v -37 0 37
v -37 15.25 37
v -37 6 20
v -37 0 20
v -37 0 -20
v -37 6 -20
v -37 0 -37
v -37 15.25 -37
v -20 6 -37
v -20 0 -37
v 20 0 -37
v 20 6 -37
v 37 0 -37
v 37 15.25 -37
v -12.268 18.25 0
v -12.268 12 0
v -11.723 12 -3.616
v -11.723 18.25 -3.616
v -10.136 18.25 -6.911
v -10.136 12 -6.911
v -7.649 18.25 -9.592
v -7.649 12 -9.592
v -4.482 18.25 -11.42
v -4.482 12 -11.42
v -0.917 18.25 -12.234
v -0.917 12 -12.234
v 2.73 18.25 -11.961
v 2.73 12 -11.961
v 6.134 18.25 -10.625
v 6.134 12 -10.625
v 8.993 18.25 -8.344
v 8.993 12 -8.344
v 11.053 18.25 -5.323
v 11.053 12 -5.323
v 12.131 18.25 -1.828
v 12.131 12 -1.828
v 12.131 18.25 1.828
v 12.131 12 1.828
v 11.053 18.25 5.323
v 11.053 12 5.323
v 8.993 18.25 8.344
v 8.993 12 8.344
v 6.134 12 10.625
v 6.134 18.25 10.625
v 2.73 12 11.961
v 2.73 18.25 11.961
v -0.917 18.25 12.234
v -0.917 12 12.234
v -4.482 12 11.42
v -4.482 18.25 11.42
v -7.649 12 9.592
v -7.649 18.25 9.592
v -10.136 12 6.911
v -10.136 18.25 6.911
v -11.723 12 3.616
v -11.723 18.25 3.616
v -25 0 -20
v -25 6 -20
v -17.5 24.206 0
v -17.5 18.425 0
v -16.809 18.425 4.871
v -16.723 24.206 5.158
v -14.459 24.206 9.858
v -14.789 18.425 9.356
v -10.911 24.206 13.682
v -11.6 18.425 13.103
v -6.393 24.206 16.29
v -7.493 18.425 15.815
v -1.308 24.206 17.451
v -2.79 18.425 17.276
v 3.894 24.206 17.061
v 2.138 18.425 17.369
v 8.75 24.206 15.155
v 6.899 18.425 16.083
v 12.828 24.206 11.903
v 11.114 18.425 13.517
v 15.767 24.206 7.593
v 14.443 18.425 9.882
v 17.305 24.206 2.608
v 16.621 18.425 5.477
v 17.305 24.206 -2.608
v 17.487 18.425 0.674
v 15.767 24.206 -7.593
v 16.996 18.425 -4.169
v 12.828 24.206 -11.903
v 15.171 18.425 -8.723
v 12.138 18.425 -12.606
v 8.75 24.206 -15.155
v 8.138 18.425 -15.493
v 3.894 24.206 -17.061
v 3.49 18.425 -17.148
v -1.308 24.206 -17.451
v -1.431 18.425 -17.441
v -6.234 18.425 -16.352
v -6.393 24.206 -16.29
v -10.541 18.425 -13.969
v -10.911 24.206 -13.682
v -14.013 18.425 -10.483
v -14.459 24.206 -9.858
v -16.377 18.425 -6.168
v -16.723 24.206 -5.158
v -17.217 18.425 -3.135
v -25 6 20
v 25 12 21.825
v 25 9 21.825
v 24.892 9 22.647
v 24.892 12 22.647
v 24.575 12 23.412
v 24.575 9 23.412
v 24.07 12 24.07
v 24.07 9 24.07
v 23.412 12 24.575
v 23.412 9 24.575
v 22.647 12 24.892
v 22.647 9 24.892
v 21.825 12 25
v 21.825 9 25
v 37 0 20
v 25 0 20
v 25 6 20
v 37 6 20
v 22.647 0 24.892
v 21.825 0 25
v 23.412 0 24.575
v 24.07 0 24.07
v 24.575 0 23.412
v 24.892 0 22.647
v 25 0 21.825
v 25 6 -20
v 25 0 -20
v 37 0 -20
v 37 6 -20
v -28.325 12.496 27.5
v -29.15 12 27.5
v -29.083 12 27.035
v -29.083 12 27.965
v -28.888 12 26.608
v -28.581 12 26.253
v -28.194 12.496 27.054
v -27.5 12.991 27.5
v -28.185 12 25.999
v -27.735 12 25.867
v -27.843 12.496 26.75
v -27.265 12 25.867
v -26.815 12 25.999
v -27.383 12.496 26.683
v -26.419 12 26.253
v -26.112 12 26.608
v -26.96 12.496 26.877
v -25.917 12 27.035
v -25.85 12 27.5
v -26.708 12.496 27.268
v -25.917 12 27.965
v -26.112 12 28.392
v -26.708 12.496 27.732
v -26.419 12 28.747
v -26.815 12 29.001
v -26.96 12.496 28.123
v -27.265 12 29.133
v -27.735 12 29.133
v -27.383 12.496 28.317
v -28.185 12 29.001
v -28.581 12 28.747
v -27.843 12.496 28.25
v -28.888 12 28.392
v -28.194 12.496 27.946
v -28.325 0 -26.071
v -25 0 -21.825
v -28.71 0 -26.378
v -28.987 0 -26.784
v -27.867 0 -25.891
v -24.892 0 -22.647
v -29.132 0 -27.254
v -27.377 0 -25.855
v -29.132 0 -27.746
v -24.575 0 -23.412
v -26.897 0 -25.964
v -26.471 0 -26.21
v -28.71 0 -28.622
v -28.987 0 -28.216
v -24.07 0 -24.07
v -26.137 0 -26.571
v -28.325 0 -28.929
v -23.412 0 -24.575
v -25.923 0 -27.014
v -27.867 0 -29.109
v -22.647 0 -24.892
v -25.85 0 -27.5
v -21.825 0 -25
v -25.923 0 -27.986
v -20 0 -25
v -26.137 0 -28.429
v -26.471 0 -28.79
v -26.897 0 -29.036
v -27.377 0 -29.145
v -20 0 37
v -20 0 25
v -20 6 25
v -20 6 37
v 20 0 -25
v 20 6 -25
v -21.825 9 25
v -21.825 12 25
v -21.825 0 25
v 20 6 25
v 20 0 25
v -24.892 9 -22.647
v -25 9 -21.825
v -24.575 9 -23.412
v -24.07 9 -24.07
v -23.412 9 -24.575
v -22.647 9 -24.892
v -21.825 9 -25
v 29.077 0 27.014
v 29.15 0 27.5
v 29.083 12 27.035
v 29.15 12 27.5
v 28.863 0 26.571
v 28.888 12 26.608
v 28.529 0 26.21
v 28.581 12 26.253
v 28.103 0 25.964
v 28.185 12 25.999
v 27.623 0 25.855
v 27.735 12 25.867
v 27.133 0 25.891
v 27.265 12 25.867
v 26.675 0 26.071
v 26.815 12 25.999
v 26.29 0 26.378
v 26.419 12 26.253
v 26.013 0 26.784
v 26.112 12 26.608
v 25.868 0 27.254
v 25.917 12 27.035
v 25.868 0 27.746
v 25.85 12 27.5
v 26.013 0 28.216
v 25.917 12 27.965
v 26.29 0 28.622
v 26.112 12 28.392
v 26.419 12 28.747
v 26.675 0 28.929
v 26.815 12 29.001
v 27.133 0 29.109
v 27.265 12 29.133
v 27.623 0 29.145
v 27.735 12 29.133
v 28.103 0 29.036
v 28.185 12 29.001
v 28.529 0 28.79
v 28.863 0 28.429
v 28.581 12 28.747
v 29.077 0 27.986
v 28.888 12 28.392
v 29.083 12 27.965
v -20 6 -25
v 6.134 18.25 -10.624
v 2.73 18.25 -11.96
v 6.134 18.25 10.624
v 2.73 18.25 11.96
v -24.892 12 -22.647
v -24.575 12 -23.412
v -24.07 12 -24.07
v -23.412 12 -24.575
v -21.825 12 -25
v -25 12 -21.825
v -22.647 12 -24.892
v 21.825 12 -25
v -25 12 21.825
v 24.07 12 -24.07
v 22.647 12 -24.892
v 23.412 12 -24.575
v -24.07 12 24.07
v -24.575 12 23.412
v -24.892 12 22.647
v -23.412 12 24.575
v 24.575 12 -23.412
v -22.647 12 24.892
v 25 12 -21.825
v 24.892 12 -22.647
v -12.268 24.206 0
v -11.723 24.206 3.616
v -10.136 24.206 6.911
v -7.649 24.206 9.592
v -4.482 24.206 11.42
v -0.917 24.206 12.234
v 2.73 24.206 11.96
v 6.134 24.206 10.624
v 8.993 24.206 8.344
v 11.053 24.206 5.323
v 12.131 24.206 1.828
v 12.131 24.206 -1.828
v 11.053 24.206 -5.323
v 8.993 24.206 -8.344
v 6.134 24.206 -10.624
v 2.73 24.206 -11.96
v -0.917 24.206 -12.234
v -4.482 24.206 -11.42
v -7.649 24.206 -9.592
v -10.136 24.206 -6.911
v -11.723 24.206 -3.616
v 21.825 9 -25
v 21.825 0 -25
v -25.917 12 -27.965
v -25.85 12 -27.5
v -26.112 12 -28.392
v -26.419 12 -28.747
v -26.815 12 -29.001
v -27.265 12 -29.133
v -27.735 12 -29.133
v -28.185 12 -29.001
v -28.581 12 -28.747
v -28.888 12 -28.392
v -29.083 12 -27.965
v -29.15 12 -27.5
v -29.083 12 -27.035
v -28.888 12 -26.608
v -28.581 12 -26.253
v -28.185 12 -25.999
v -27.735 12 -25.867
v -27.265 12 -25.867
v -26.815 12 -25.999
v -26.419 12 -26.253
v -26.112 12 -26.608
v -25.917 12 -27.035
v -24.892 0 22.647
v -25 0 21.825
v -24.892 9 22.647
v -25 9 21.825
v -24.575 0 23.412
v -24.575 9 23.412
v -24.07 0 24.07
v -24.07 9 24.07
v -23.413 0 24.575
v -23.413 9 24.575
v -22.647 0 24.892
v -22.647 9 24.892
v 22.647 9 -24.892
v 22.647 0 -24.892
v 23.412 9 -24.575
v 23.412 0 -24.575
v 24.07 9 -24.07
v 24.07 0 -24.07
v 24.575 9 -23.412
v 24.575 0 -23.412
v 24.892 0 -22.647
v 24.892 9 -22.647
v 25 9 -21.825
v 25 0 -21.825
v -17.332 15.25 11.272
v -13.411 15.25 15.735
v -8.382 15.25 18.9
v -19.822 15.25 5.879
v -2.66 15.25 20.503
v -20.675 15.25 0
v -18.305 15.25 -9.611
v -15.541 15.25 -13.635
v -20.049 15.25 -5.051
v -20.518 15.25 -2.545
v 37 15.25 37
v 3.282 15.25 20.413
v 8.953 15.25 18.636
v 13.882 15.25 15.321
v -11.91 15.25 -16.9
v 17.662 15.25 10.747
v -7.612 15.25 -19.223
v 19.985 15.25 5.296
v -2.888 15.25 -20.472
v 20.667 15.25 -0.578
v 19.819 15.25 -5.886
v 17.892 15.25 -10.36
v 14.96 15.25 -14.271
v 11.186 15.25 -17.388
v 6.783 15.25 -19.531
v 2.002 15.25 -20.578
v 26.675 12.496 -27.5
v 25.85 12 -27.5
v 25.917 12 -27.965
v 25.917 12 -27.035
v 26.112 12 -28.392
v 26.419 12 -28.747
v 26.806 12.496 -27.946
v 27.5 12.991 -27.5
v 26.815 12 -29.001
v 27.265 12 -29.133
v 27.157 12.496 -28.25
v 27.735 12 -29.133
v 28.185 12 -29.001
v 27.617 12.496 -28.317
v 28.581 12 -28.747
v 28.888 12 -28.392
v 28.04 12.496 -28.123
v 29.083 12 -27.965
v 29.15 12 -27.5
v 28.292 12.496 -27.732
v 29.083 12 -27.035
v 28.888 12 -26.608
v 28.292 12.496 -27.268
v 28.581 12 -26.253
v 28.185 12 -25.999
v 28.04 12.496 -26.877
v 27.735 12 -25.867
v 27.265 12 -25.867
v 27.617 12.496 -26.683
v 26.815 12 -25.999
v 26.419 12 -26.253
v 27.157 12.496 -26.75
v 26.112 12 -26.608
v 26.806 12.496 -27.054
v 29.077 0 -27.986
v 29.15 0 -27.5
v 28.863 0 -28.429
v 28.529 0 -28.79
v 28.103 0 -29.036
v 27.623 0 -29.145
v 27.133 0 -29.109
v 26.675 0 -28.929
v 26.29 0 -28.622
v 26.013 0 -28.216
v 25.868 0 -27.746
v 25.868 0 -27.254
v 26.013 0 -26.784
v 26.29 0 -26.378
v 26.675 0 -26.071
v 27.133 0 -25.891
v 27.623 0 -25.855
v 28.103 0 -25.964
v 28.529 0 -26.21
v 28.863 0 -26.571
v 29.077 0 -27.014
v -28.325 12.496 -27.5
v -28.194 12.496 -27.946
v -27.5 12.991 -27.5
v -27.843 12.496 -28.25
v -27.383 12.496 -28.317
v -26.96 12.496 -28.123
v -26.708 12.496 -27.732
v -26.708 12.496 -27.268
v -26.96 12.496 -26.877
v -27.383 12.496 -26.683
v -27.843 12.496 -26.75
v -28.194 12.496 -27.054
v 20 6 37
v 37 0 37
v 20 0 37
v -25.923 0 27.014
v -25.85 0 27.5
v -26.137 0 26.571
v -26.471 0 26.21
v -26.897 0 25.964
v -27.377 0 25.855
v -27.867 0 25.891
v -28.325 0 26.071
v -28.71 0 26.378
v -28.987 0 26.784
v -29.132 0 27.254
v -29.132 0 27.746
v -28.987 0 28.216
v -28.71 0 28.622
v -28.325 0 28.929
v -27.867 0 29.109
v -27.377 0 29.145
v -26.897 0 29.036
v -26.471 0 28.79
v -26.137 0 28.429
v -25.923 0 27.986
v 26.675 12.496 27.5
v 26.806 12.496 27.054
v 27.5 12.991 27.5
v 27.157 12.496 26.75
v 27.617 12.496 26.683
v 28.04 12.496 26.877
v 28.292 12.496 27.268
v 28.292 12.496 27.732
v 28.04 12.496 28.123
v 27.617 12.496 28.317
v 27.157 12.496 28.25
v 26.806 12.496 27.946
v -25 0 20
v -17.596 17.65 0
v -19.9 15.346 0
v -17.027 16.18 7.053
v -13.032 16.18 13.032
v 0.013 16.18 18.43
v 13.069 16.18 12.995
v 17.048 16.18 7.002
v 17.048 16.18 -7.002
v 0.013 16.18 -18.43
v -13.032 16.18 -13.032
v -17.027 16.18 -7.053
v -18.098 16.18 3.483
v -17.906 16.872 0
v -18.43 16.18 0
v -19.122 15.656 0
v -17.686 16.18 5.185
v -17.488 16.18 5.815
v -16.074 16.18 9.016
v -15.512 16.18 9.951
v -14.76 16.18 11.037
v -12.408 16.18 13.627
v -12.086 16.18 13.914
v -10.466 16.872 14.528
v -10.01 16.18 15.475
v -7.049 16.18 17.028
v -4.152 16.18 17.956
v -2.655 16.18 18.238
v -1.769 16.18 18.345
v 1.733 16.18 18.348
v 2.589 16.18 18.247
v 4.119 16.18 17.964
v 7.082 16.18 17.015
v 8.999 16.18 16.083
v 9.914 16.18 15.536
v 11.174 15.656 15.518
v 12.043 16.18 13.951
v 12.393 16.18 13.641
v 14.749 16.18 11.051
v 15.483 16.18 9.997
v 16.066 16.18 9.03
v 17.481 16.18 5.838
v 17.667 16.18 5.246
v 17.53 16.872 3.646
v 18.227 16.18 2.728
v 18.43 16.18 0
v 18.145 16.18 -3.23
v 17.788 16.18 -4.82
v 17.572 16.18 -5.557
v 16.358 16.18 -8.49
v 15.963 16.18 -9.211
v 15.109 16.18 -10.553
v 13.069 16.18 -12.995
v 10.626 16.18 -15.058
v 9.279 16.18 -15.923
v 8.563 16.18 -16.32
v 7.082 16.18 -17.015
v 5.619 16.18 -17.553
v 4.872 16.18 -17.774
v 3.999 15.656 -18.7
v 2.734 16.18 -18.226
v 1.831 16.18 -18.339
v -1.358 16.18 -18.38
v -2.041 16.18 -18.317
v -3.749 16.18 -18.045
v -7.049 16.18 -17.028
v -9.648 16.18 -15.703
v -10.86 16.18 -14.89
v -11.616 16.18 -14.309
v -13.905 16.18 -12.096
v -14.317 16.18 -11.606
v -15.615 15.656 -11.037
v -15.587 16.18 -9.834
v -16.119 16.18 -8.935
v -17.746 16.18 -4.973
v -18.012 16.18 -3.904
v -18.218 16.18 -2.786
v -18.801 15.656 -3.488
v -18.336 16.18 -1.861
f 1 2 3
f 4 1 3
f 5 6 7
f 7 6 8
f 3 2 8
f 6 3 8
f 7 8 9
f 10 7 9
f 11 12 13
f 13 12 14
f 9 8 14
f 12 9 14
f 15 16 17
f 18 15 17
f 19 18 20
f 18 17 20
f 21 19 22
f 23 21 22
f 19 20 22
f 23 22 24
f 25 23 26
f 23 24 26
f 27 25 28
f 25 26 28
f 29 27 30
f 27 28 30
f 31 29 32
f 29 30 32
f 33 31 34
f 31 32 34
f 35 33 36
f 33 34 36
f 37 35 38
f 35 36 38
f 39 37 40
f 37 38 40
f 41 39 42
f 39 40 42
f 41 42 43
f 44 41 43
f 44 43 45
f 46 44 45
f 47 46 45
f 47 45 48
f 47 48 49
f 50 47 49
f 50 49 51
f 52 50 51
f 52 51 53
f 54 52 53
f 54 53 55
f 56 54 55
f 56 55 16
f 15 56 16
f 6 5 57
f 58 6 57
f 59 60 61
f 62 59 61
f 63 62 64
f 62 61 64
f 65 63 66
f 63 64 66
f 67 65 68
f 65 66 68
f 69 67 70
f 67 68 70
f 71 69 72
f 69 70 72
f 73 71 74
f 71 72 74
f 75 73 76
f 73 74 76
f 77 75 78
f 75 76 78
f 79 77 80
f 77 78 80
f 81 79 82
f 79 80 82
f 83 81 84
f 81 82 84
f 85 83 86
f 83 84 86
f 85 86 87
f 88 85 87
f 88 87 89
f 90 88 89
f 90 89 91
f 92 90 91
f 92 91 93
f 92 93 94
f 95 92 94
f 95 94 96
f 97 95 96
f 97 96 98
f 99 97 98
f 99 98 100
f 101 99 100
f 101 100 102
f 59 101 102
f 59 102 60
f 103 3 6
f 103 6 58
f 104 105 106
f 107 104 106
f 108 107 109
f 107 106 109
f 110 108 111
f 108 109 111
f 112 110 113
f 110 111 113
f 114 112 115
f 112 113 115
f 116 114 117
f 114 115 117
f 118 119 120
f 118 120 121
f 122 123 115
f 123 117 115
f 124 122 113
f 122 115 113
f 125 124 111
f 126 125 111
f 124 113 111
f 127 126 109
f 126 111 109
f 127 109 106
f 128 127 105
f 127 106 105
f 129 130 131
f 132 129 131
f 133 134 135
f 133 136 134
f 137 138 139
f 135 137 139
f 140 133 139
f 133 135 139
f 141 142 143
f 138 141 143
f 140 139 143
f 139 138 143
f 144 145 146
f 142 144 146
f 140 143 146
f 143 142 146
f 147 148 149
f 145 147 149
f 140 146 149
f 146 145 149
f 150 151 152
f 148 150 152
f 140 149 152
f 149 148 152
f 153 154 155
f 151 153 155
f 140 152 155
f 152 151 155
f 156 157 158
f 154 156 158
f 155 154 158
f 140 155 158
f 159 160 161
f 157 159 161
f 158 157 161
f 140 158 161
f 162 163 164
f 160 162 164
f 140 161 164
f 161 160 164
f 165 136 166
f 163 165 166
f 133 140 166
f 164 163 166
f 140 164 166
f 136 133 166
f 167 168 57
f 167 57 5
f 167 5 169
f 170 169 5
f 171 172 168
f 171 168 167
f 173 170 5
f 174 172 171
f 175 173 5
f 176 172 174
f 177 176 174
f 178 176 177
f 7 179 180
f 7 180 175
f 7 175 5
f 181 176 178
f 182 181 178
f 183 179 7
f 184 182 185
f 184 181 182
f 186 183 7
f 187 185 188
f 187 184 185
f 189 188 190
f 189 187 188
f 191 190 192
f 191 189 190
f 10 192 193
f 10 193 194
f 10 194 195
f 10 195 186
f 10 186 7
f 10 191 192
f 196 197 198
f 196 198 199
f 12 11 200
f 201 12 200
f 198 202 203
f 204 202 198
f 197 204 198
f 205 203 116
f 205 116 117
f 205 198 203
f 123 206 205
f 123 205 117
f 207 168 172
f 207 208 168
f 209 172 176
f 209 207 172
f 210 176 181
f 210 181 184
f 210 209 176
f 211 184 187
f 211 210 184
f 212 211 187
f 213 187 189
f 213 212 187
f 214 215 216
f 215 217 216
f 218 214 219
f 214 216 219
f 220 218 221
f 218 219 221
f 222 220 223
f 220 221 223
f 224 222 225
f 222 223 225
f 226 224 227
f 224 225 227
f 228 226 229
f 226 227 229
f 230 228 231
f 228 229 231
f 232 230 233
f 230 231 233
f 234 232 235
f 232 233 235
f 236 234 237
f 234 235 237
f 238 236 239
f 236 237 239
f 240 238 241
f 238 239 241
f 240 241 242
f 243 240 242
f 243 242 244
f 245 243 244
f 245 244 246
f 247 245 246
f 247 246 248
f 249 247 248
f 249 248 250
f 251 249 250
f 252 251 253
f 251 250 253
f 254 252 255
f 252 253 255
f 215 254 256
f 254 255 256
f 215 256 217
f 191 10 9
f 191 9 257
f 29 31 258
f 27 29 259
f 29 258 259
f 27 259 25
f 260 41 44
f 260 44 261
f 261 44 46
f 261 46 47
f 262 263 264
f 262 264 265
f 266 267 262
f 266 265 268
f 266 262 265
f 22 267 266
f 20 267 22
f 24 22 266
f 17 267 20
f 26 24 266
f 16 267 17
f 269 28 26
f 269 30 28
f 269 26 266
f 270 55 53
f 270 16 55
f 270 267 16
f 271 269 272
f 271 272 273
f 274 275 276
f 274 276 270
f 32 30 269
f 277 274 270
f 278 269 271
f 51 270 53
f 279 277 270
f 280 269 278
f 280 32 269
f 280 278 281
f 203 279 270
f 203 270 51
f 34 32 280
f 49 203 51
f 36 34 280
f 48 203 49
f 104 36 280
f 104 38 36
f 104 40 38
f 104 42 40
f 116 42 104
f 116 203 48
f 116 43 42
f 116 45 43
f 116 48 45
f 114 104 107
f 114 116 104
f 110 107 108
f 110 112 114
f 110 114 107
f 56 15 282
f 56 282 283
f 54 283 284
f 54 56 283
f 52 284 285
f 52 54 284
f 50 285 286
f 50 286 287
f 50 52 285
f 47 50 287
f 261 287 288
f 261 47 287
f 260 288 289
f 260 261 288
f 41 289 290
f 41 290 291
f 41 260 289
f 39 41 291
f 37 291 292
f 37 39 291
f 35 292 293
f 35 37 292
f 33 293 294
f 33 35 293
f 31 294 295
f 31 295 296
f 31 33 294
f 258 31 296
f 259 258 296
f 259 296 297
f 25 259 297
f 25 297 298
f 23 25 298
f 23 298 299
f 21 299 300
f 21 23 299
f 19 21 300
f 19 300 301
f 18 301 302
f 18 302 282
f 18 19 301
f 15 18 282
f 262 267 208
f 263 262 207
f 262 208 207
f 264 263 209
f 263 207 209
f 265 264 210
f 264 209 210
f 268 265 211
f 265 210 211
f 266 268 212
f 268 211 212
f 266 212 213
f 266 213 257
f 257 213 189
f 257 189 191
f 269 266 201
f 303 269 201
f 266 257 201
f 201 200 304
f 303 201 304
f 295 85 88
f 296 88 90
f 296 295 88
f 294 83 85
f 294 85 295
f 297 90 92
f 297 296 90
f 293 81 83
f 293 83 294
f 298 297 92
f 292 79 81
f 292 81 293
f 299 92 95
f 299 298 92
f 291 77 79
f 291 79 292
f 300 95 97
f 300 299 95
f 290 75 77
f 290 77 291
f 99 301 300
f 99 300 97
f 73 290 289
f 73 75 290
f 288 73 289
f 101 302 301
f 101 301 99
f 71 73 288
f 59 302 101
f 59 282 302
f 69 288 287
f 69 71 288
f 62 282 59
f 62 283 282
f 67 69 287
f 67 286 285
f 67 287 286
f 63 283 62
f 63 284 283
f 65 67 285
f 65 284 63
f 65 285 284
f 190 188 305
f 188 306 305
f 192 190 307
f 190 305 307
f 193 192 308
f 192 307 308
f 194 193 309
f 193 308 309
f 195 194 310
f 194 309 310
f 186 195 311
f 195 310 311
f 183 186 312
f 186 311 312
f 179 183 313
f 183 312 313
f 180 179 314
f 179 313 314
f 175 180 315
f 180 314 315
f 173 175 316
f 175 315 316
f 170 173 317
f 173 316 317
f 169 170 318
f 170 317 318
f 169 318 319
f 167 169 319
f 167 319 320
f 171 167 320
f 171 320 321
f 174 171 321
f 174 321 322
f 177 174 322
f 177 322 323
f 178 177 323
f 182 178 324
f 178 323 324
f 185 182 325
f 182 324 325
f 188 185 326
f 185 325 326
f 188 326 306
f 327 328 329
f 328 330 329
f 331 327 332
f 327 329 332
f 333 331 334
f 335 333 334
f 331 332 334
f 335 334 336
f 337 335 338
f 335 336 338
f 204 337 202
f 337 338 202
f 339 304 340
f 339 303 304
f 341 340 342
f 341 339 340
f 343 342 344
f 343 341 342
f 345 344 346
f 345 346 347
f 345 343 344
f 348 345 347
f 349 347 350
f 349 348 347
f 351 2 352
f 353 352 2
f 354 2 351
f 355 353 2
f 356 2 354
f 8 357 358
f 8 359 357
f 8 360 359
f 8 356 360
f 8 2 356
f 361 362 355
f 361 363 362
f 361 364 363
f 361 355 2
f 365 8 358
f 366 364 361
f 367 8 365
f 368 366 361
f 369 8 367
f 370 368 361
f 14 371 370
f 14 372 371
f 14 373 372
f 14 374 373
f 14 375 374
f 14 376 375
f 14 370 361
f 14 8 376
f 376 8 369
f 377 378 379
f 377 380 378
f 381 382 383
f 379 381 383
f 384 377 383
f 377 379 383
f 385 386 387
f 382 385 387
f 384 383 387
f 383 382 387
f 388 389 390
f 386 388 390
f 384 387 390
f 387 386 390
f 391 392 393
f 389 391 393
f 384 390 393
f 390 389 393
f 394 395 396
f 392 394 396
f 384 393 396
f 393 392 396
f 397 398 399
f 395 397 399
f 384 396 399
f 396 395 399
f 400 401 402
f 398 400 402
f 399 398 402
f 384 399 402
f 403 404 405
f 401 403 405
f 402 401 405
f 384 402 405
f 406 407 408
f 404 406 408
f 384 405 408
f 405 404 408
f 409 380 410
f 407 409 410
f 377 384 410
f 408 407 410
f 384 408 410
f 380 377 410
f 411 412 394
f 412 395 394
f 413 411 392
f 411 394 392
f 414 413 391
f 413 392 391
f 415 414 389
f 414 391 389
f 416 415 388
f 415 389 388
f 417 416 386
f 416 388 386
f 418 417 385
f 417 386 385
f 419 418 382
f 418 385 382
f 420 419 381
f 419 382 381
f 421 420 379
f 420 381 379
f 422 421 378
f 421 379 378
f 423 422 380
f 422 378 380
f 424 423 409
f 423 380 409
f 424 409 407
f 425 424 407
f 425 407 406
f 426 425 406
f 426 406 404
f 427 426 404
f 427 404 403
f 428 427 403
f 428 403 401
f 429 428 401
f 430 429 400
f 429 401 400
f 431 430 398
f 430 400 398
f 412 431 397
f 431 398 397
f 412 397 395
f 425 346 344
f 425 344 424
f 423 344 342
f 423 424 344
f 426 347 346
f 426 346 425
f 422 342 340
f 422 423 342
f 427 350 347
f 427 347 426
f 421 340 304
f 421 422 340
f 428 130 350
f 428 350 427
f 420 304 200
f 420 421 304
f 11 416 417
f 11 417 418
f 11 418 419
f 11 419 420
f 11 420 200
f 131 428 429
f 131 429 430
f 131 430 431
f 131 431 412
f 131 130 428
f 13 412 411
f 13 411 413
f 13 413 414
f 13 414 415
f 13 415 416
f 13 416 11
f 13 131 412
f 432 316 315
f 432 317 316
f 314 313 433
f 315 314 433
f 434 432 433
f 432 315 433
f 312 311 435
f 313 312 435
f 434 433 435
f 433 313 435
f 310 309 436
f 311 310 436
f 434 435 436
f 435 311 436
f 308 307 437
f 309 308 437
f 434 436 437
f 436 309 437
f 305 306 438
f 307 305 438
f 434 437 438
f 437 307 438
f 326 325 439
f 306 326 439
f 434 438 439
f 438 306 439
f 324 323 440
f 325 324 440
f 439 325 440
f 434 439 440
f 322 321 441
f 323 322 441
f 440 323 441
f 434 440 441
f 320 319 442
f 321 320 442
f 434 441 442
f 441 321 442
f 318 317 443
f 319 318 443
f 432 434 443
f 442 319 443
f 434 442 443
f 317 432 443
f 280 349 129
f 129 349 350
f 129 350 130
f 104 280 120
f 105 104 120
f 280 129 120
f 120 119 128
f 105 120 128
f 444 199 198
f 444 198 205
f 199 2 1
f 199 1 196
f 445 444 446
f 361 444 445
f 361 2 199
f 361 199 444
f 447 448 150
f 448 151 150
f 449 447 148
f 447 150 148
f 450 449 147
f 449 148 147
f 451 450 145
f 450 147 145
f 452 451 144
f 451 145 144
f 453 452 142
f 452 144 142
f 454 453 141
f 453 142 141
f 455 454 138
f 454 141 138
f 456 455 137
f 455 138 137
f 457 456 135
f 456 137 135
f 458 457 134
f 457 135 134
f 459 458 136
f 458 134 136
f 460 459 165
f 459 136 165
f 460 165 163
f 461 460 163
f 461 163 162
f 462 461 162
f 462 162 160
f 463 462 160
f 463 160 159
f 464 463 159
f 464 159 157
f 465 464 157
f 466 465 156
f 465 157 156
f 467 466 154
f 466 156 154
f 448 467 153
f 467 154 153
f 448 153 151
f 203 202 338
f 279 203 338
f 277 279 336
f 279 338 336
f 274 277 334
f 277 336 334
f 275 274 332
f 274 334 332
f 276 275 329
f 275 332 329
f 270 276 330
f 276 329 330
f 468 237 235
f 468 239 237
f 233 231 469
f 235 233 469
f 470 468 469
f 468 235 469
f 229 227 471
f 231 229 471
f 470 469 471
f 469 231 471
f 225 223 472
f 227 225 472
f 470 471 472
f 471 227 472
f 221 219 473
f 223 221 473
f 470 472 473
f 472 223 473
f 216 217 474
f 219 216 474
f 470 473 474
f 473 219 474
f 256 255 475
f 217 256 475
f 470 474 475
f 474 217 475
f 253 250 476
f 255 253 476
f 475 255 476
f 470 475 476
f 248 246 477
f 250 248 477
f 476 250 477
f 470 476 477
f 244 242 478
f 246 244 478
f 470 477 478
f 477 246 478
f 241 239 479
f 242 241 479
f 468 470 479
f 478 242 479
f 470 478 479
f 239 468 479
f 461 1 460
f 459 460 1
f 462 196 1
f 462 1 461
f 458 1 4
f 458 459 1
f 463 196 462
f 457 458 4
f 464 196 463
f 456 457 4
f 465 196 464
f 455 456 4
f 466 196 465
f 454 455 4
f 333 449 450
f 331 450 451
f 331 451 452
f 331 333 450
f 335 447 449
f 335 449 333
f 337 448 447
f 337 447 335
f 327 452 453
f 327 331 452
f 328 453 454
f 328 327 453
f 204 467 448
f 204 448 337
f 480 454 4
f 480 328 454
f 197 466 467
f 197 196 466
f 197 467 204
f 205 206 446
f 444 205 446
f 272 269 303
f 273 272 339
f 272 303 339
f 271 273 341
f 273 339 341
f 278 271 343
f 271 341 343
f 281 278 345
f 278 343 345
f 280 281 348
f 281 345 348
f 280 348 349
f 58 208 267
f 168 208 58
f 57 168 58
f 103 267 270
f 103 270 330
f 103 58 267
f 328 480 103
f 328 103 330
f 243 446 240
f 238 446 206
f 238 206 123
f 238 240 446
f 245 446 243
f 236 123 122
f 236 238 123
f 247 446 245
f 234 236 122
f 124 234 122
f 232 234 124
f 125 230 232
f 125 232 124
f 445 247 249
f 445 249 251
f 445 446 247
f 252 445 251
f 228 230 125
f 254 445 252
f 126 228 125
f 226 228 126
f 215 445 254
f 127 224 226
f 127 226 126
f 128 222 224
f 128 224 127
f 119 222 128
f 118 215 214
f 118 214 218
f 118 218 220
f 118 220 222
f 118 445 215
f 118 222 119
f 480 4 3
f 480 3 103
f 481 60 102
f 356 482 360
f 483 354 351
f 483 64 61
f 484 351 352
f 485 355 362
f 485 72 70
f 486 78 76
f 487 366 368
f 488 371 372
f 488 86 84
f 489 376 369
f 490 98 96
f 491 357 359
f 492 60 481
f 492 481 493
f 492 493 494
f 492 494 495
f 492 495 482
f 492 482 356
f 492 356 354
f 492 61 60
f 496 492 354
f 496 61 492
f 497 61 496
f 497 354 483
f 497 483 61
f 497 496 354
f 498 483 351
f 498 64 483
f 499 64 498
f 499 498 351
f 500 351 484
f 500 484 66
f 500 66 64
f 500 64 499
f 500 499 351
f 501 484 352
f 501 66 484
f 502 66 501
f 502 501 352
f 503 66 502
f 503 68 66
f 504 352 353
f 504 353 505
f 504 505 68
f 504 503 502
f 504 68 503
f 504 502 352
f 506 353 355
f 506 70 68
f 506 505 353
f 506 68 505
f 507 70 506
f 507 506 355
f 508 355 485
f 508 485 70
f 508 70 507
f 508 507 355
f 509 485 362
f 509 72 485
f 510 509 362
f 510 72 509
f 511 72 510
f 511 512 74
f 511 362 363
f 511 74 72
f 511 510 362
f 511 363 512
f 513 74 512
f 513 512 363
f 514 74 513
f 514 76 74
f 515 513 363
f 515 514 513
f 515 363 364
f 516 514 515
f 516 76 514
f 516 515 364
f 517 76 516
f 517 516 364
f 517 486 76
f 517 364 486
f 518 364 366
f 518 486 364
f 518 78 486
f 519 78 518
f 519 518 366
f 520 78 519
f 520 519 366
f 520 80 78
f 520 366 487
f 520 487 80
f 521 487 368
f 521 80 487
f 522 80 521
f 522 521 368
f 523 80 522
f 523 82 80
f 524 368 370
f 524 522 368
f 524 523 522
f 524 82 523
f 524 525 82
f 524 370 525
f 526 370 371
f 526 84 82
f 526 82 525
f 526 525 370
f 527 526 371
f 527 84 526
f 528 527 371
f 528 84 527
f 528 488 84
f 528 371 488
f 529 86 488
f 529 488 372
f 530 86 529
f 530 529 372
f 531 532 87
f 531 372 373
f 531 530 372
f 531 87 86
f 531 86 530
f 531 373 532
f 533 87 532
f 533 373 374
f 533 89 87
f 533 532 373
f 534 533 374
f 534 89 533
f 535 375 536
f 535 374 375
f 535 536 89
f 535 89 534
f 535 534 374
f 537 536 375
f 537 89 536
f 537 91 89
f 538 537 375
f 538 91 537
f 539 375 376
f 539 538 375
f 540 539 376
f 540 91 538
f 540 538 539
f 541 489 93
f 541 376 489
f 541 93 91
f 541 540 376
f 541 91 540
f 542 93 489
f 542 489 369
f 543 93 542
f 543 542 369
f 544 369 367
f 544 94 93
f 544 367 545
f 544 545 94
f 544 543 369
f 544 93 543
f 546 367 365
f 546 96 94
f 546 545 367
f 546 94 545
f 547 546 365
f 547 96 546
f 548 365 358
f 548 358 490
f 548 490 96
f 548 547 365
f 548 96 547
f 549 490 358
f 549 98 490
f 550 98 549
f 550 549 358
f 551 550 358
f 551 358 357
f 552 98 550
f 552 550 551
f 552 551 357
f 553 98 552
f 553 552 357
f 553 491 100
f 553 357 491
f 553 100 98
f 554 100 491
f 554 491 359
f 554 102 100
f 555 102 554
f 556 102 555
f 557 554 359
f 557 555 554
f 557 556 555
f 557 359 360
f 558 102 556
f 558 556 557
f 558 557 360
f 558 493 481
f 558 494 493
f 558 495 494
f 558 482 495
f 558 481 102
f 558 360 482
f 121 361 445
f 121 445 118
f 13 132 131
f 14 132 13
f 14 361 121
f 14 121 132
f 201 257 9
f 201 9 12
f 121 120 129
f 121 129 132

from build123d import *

# Parameters (mm, degrees)
SKETCH1_W            = 18.25
SKETCH1_H            = 40
OUTLINE_DEPTH        = 40
OUTLINE_DEPTH_BACK   = 40
SKETCH2_W            = 40
SKETCH2_H            = 80
EXTRUSION15_DEPTH    = 6
CAMERA_MOUNT_D       = 24.5364
SKETCH5_R            = 17.5
SKETCH5_R_2          = 12.268
EXTRUSION19_DEPTH    = 5.9562
SKETCH10_W           = 80
SKETCH10_H           = 80
SKETCH10_R           = 17.5
CUT_EXTRUDE1_DEPTH   = 3
SKETCH6_W            = 80
SKETCH6_H            = 40
EXTRUSION21_DEPTH    = 6
SKETCH7_W            = 50
SKETCH7_H            = 50
EXTRUSION22_DEPTH    = 9
FILLET4_R            = 3.175
HOLE7_D              = 3.3
HOLE7_DEPTH          = 12
HOLE7_TIP            = 0.991420021
SKETCH11_OUTSIDE_W   = 105.14
SKETCH11_OUTSIDE_H   = 105.14
SKETCH11_OUTSIDE_W_2 = 74
SKETCH11_OUTSIDE_H_2 = 74
CUT_EXTRUDE2_DEPTH   = 16.25
CUT_EXTRUDE3_DEPTH   = 3


with BuildPart() as part:
    # Sketch1 → Outline (new body, two sides)
    with BuildSketch(Plane.YZ) as outline_sk:
        Polygon((18.25, 40), (5.33, 40), (0, 40), (0, 0), (18.25, 0), align=None)
        with Locations((9.125, -20)):
            Rectangle(SKETCH1_W, SKETCH1_H)
    extrude(amount=OUTLINE_DEPTH)
    extrude(outline_sk.sketch, amount=-OUTLINE_DEPTH_BACK)

    # Sketch2 → Extrusion15 (cut)
    with BuildSketch(Plane.XZ):
        Rectangle(SKETCH2_W, SKETCH2_H)
    extrude(amount=-EXTRUSION15_DEPTH, mode=Mode.SUBTRACT)

    # Camera mount (through all)
    with Locations(Plane(origin=(0, 18.25, 0), x_dir=(1, 0, 0), z_dir=(0, 1, 0))):
        with Locations((0, 0)):
            Hole(CAMERA_MOUNT_D / 2)

    # Sketch5 → Extrusion19 (add)
    with BuildSketch(Plane(origin=(0, 18.25, 0), x_dir=(-1, 0, 0), z_dir=(0, 1, 0))):
        Circle(SKETCH5_R)
        Circle(SKETCH5_R_2, mode=Mode.SUBTRACT)
    extrude(amount=EXTRUSION19_DEPTH)

    # Sketch10 → Cut-Extrude1 (cut)
    with BuildSketch(Plane(origin=(0, 18.25, 0), x_dir=(1, 0, 0), z_dir=(0, 1, 0))):
        Rectangle(SKETCH10_W, SKETCH10_H)
        Circle(SKETCH10_R, mode=Mode.SUBTRACT)
    extrude(amount=-CUT_EXTRUDE1_DEPTH, mode=Mode.SUBTRACT)

    # Sketch6 → Extrusion21 (cut)
    with BuildSketch(Plane.XZ):
        Rectangle(SKETCH6_W, SKETCH6_H)
    extrude(amount=-EXTRUSION21_DEPTH, mode=Mode.SUBTRACT)

    # Sketch7 → Extrusion22 (cut)
    with BuildSketch(Plane.XZ):
        Rectangle(SKETCH7_W, SKETCH7_H)
    extrude(amount=-EXTRUSION22_DEPTH, mode=Mode.SUBTRACT)

    # Fillet4
    fillet4_edges = [part.edges().sort_by_distance(p)[0] for p in [
        (-25, 4.5, 25),
        (25, 4.5, -25),
        (25, 4.5, 25),
        (-25, 4.5, -25),
        (-17.5, 15.25, 0),
    ]]
    fillet(fillet4_edges, radius=FILLET4_R)

    # Hole7
    with Locations(Plane(origin=(0, 0, 0), x_dir=(-1, 0, 0), z_dir=(0, -1, 0))):
        with Locations((27.5, 27.5), (-27.5, 27.5), (-27.5, -27.5), (27.5, -27.5)):
            Hole(HOLE7_D / 2, depth=HOLE7_DEPTH)
            with Locations((0, 0, -(HOLE7_DEPTH + HOLE7_TIP / 2))):  # 118° drill point
                Cone(0, HOLE7_D / 2, HOLE7_TIP, mode=Mode.SUBTRACT)

    # Sketch11 outside → Cut-Extrude2 (cut, through all)
    with BuildSketch(Plane(origin=(0, 15.25, 0), x_dir=(1, 0, 0), z_dir=(0, 1, 0))):
        Rectangle(SKETCH11_OUTSIDE_W, SKETCH11_OUTSIDE_H)
        Rectangle(SKETCH11_OUTSIDE_W_2, SKETCH11_OUTSIDE_H_2, mode=Mode.SUBTRACT)
    extrude(amount=-CUT_EXTRUDE2_DEPTH, mode=Mode.SUBTRACT)

    # Sketch13 → Cut-Extrude3 (cut)
    with BuildSketch(Plane.XZ.offset(-9)):
        with BuildLine():
            Line((21.825, 25), (-21.825, 25))
            ThreePointArc((-21.825, 25), (-24.07006403, 24.07006403), (-25, 21.825))
            Line((-25, 21.825), (-25, -21.825))
            ThreePointArc((-25, -21.825), (-24.07006403, -24.07006403), (-21.825, -25))
            Line((-21.825, -25), (21.825, -25))
            ThreePointArc((21.825, -25), (24.07006403, -24.07006403), (25, -21.825))
            Line((25, -21.825), (25, 21.825))
            ThreePointArc((25, 21.825), (24.07006403, 24.07006403), (21.825, 25))
        make_face()
    extrude(amount=-CUT_EXTRUDE3_DEPTH, mode=Mode.SUBTRACT)


solid = part.part
